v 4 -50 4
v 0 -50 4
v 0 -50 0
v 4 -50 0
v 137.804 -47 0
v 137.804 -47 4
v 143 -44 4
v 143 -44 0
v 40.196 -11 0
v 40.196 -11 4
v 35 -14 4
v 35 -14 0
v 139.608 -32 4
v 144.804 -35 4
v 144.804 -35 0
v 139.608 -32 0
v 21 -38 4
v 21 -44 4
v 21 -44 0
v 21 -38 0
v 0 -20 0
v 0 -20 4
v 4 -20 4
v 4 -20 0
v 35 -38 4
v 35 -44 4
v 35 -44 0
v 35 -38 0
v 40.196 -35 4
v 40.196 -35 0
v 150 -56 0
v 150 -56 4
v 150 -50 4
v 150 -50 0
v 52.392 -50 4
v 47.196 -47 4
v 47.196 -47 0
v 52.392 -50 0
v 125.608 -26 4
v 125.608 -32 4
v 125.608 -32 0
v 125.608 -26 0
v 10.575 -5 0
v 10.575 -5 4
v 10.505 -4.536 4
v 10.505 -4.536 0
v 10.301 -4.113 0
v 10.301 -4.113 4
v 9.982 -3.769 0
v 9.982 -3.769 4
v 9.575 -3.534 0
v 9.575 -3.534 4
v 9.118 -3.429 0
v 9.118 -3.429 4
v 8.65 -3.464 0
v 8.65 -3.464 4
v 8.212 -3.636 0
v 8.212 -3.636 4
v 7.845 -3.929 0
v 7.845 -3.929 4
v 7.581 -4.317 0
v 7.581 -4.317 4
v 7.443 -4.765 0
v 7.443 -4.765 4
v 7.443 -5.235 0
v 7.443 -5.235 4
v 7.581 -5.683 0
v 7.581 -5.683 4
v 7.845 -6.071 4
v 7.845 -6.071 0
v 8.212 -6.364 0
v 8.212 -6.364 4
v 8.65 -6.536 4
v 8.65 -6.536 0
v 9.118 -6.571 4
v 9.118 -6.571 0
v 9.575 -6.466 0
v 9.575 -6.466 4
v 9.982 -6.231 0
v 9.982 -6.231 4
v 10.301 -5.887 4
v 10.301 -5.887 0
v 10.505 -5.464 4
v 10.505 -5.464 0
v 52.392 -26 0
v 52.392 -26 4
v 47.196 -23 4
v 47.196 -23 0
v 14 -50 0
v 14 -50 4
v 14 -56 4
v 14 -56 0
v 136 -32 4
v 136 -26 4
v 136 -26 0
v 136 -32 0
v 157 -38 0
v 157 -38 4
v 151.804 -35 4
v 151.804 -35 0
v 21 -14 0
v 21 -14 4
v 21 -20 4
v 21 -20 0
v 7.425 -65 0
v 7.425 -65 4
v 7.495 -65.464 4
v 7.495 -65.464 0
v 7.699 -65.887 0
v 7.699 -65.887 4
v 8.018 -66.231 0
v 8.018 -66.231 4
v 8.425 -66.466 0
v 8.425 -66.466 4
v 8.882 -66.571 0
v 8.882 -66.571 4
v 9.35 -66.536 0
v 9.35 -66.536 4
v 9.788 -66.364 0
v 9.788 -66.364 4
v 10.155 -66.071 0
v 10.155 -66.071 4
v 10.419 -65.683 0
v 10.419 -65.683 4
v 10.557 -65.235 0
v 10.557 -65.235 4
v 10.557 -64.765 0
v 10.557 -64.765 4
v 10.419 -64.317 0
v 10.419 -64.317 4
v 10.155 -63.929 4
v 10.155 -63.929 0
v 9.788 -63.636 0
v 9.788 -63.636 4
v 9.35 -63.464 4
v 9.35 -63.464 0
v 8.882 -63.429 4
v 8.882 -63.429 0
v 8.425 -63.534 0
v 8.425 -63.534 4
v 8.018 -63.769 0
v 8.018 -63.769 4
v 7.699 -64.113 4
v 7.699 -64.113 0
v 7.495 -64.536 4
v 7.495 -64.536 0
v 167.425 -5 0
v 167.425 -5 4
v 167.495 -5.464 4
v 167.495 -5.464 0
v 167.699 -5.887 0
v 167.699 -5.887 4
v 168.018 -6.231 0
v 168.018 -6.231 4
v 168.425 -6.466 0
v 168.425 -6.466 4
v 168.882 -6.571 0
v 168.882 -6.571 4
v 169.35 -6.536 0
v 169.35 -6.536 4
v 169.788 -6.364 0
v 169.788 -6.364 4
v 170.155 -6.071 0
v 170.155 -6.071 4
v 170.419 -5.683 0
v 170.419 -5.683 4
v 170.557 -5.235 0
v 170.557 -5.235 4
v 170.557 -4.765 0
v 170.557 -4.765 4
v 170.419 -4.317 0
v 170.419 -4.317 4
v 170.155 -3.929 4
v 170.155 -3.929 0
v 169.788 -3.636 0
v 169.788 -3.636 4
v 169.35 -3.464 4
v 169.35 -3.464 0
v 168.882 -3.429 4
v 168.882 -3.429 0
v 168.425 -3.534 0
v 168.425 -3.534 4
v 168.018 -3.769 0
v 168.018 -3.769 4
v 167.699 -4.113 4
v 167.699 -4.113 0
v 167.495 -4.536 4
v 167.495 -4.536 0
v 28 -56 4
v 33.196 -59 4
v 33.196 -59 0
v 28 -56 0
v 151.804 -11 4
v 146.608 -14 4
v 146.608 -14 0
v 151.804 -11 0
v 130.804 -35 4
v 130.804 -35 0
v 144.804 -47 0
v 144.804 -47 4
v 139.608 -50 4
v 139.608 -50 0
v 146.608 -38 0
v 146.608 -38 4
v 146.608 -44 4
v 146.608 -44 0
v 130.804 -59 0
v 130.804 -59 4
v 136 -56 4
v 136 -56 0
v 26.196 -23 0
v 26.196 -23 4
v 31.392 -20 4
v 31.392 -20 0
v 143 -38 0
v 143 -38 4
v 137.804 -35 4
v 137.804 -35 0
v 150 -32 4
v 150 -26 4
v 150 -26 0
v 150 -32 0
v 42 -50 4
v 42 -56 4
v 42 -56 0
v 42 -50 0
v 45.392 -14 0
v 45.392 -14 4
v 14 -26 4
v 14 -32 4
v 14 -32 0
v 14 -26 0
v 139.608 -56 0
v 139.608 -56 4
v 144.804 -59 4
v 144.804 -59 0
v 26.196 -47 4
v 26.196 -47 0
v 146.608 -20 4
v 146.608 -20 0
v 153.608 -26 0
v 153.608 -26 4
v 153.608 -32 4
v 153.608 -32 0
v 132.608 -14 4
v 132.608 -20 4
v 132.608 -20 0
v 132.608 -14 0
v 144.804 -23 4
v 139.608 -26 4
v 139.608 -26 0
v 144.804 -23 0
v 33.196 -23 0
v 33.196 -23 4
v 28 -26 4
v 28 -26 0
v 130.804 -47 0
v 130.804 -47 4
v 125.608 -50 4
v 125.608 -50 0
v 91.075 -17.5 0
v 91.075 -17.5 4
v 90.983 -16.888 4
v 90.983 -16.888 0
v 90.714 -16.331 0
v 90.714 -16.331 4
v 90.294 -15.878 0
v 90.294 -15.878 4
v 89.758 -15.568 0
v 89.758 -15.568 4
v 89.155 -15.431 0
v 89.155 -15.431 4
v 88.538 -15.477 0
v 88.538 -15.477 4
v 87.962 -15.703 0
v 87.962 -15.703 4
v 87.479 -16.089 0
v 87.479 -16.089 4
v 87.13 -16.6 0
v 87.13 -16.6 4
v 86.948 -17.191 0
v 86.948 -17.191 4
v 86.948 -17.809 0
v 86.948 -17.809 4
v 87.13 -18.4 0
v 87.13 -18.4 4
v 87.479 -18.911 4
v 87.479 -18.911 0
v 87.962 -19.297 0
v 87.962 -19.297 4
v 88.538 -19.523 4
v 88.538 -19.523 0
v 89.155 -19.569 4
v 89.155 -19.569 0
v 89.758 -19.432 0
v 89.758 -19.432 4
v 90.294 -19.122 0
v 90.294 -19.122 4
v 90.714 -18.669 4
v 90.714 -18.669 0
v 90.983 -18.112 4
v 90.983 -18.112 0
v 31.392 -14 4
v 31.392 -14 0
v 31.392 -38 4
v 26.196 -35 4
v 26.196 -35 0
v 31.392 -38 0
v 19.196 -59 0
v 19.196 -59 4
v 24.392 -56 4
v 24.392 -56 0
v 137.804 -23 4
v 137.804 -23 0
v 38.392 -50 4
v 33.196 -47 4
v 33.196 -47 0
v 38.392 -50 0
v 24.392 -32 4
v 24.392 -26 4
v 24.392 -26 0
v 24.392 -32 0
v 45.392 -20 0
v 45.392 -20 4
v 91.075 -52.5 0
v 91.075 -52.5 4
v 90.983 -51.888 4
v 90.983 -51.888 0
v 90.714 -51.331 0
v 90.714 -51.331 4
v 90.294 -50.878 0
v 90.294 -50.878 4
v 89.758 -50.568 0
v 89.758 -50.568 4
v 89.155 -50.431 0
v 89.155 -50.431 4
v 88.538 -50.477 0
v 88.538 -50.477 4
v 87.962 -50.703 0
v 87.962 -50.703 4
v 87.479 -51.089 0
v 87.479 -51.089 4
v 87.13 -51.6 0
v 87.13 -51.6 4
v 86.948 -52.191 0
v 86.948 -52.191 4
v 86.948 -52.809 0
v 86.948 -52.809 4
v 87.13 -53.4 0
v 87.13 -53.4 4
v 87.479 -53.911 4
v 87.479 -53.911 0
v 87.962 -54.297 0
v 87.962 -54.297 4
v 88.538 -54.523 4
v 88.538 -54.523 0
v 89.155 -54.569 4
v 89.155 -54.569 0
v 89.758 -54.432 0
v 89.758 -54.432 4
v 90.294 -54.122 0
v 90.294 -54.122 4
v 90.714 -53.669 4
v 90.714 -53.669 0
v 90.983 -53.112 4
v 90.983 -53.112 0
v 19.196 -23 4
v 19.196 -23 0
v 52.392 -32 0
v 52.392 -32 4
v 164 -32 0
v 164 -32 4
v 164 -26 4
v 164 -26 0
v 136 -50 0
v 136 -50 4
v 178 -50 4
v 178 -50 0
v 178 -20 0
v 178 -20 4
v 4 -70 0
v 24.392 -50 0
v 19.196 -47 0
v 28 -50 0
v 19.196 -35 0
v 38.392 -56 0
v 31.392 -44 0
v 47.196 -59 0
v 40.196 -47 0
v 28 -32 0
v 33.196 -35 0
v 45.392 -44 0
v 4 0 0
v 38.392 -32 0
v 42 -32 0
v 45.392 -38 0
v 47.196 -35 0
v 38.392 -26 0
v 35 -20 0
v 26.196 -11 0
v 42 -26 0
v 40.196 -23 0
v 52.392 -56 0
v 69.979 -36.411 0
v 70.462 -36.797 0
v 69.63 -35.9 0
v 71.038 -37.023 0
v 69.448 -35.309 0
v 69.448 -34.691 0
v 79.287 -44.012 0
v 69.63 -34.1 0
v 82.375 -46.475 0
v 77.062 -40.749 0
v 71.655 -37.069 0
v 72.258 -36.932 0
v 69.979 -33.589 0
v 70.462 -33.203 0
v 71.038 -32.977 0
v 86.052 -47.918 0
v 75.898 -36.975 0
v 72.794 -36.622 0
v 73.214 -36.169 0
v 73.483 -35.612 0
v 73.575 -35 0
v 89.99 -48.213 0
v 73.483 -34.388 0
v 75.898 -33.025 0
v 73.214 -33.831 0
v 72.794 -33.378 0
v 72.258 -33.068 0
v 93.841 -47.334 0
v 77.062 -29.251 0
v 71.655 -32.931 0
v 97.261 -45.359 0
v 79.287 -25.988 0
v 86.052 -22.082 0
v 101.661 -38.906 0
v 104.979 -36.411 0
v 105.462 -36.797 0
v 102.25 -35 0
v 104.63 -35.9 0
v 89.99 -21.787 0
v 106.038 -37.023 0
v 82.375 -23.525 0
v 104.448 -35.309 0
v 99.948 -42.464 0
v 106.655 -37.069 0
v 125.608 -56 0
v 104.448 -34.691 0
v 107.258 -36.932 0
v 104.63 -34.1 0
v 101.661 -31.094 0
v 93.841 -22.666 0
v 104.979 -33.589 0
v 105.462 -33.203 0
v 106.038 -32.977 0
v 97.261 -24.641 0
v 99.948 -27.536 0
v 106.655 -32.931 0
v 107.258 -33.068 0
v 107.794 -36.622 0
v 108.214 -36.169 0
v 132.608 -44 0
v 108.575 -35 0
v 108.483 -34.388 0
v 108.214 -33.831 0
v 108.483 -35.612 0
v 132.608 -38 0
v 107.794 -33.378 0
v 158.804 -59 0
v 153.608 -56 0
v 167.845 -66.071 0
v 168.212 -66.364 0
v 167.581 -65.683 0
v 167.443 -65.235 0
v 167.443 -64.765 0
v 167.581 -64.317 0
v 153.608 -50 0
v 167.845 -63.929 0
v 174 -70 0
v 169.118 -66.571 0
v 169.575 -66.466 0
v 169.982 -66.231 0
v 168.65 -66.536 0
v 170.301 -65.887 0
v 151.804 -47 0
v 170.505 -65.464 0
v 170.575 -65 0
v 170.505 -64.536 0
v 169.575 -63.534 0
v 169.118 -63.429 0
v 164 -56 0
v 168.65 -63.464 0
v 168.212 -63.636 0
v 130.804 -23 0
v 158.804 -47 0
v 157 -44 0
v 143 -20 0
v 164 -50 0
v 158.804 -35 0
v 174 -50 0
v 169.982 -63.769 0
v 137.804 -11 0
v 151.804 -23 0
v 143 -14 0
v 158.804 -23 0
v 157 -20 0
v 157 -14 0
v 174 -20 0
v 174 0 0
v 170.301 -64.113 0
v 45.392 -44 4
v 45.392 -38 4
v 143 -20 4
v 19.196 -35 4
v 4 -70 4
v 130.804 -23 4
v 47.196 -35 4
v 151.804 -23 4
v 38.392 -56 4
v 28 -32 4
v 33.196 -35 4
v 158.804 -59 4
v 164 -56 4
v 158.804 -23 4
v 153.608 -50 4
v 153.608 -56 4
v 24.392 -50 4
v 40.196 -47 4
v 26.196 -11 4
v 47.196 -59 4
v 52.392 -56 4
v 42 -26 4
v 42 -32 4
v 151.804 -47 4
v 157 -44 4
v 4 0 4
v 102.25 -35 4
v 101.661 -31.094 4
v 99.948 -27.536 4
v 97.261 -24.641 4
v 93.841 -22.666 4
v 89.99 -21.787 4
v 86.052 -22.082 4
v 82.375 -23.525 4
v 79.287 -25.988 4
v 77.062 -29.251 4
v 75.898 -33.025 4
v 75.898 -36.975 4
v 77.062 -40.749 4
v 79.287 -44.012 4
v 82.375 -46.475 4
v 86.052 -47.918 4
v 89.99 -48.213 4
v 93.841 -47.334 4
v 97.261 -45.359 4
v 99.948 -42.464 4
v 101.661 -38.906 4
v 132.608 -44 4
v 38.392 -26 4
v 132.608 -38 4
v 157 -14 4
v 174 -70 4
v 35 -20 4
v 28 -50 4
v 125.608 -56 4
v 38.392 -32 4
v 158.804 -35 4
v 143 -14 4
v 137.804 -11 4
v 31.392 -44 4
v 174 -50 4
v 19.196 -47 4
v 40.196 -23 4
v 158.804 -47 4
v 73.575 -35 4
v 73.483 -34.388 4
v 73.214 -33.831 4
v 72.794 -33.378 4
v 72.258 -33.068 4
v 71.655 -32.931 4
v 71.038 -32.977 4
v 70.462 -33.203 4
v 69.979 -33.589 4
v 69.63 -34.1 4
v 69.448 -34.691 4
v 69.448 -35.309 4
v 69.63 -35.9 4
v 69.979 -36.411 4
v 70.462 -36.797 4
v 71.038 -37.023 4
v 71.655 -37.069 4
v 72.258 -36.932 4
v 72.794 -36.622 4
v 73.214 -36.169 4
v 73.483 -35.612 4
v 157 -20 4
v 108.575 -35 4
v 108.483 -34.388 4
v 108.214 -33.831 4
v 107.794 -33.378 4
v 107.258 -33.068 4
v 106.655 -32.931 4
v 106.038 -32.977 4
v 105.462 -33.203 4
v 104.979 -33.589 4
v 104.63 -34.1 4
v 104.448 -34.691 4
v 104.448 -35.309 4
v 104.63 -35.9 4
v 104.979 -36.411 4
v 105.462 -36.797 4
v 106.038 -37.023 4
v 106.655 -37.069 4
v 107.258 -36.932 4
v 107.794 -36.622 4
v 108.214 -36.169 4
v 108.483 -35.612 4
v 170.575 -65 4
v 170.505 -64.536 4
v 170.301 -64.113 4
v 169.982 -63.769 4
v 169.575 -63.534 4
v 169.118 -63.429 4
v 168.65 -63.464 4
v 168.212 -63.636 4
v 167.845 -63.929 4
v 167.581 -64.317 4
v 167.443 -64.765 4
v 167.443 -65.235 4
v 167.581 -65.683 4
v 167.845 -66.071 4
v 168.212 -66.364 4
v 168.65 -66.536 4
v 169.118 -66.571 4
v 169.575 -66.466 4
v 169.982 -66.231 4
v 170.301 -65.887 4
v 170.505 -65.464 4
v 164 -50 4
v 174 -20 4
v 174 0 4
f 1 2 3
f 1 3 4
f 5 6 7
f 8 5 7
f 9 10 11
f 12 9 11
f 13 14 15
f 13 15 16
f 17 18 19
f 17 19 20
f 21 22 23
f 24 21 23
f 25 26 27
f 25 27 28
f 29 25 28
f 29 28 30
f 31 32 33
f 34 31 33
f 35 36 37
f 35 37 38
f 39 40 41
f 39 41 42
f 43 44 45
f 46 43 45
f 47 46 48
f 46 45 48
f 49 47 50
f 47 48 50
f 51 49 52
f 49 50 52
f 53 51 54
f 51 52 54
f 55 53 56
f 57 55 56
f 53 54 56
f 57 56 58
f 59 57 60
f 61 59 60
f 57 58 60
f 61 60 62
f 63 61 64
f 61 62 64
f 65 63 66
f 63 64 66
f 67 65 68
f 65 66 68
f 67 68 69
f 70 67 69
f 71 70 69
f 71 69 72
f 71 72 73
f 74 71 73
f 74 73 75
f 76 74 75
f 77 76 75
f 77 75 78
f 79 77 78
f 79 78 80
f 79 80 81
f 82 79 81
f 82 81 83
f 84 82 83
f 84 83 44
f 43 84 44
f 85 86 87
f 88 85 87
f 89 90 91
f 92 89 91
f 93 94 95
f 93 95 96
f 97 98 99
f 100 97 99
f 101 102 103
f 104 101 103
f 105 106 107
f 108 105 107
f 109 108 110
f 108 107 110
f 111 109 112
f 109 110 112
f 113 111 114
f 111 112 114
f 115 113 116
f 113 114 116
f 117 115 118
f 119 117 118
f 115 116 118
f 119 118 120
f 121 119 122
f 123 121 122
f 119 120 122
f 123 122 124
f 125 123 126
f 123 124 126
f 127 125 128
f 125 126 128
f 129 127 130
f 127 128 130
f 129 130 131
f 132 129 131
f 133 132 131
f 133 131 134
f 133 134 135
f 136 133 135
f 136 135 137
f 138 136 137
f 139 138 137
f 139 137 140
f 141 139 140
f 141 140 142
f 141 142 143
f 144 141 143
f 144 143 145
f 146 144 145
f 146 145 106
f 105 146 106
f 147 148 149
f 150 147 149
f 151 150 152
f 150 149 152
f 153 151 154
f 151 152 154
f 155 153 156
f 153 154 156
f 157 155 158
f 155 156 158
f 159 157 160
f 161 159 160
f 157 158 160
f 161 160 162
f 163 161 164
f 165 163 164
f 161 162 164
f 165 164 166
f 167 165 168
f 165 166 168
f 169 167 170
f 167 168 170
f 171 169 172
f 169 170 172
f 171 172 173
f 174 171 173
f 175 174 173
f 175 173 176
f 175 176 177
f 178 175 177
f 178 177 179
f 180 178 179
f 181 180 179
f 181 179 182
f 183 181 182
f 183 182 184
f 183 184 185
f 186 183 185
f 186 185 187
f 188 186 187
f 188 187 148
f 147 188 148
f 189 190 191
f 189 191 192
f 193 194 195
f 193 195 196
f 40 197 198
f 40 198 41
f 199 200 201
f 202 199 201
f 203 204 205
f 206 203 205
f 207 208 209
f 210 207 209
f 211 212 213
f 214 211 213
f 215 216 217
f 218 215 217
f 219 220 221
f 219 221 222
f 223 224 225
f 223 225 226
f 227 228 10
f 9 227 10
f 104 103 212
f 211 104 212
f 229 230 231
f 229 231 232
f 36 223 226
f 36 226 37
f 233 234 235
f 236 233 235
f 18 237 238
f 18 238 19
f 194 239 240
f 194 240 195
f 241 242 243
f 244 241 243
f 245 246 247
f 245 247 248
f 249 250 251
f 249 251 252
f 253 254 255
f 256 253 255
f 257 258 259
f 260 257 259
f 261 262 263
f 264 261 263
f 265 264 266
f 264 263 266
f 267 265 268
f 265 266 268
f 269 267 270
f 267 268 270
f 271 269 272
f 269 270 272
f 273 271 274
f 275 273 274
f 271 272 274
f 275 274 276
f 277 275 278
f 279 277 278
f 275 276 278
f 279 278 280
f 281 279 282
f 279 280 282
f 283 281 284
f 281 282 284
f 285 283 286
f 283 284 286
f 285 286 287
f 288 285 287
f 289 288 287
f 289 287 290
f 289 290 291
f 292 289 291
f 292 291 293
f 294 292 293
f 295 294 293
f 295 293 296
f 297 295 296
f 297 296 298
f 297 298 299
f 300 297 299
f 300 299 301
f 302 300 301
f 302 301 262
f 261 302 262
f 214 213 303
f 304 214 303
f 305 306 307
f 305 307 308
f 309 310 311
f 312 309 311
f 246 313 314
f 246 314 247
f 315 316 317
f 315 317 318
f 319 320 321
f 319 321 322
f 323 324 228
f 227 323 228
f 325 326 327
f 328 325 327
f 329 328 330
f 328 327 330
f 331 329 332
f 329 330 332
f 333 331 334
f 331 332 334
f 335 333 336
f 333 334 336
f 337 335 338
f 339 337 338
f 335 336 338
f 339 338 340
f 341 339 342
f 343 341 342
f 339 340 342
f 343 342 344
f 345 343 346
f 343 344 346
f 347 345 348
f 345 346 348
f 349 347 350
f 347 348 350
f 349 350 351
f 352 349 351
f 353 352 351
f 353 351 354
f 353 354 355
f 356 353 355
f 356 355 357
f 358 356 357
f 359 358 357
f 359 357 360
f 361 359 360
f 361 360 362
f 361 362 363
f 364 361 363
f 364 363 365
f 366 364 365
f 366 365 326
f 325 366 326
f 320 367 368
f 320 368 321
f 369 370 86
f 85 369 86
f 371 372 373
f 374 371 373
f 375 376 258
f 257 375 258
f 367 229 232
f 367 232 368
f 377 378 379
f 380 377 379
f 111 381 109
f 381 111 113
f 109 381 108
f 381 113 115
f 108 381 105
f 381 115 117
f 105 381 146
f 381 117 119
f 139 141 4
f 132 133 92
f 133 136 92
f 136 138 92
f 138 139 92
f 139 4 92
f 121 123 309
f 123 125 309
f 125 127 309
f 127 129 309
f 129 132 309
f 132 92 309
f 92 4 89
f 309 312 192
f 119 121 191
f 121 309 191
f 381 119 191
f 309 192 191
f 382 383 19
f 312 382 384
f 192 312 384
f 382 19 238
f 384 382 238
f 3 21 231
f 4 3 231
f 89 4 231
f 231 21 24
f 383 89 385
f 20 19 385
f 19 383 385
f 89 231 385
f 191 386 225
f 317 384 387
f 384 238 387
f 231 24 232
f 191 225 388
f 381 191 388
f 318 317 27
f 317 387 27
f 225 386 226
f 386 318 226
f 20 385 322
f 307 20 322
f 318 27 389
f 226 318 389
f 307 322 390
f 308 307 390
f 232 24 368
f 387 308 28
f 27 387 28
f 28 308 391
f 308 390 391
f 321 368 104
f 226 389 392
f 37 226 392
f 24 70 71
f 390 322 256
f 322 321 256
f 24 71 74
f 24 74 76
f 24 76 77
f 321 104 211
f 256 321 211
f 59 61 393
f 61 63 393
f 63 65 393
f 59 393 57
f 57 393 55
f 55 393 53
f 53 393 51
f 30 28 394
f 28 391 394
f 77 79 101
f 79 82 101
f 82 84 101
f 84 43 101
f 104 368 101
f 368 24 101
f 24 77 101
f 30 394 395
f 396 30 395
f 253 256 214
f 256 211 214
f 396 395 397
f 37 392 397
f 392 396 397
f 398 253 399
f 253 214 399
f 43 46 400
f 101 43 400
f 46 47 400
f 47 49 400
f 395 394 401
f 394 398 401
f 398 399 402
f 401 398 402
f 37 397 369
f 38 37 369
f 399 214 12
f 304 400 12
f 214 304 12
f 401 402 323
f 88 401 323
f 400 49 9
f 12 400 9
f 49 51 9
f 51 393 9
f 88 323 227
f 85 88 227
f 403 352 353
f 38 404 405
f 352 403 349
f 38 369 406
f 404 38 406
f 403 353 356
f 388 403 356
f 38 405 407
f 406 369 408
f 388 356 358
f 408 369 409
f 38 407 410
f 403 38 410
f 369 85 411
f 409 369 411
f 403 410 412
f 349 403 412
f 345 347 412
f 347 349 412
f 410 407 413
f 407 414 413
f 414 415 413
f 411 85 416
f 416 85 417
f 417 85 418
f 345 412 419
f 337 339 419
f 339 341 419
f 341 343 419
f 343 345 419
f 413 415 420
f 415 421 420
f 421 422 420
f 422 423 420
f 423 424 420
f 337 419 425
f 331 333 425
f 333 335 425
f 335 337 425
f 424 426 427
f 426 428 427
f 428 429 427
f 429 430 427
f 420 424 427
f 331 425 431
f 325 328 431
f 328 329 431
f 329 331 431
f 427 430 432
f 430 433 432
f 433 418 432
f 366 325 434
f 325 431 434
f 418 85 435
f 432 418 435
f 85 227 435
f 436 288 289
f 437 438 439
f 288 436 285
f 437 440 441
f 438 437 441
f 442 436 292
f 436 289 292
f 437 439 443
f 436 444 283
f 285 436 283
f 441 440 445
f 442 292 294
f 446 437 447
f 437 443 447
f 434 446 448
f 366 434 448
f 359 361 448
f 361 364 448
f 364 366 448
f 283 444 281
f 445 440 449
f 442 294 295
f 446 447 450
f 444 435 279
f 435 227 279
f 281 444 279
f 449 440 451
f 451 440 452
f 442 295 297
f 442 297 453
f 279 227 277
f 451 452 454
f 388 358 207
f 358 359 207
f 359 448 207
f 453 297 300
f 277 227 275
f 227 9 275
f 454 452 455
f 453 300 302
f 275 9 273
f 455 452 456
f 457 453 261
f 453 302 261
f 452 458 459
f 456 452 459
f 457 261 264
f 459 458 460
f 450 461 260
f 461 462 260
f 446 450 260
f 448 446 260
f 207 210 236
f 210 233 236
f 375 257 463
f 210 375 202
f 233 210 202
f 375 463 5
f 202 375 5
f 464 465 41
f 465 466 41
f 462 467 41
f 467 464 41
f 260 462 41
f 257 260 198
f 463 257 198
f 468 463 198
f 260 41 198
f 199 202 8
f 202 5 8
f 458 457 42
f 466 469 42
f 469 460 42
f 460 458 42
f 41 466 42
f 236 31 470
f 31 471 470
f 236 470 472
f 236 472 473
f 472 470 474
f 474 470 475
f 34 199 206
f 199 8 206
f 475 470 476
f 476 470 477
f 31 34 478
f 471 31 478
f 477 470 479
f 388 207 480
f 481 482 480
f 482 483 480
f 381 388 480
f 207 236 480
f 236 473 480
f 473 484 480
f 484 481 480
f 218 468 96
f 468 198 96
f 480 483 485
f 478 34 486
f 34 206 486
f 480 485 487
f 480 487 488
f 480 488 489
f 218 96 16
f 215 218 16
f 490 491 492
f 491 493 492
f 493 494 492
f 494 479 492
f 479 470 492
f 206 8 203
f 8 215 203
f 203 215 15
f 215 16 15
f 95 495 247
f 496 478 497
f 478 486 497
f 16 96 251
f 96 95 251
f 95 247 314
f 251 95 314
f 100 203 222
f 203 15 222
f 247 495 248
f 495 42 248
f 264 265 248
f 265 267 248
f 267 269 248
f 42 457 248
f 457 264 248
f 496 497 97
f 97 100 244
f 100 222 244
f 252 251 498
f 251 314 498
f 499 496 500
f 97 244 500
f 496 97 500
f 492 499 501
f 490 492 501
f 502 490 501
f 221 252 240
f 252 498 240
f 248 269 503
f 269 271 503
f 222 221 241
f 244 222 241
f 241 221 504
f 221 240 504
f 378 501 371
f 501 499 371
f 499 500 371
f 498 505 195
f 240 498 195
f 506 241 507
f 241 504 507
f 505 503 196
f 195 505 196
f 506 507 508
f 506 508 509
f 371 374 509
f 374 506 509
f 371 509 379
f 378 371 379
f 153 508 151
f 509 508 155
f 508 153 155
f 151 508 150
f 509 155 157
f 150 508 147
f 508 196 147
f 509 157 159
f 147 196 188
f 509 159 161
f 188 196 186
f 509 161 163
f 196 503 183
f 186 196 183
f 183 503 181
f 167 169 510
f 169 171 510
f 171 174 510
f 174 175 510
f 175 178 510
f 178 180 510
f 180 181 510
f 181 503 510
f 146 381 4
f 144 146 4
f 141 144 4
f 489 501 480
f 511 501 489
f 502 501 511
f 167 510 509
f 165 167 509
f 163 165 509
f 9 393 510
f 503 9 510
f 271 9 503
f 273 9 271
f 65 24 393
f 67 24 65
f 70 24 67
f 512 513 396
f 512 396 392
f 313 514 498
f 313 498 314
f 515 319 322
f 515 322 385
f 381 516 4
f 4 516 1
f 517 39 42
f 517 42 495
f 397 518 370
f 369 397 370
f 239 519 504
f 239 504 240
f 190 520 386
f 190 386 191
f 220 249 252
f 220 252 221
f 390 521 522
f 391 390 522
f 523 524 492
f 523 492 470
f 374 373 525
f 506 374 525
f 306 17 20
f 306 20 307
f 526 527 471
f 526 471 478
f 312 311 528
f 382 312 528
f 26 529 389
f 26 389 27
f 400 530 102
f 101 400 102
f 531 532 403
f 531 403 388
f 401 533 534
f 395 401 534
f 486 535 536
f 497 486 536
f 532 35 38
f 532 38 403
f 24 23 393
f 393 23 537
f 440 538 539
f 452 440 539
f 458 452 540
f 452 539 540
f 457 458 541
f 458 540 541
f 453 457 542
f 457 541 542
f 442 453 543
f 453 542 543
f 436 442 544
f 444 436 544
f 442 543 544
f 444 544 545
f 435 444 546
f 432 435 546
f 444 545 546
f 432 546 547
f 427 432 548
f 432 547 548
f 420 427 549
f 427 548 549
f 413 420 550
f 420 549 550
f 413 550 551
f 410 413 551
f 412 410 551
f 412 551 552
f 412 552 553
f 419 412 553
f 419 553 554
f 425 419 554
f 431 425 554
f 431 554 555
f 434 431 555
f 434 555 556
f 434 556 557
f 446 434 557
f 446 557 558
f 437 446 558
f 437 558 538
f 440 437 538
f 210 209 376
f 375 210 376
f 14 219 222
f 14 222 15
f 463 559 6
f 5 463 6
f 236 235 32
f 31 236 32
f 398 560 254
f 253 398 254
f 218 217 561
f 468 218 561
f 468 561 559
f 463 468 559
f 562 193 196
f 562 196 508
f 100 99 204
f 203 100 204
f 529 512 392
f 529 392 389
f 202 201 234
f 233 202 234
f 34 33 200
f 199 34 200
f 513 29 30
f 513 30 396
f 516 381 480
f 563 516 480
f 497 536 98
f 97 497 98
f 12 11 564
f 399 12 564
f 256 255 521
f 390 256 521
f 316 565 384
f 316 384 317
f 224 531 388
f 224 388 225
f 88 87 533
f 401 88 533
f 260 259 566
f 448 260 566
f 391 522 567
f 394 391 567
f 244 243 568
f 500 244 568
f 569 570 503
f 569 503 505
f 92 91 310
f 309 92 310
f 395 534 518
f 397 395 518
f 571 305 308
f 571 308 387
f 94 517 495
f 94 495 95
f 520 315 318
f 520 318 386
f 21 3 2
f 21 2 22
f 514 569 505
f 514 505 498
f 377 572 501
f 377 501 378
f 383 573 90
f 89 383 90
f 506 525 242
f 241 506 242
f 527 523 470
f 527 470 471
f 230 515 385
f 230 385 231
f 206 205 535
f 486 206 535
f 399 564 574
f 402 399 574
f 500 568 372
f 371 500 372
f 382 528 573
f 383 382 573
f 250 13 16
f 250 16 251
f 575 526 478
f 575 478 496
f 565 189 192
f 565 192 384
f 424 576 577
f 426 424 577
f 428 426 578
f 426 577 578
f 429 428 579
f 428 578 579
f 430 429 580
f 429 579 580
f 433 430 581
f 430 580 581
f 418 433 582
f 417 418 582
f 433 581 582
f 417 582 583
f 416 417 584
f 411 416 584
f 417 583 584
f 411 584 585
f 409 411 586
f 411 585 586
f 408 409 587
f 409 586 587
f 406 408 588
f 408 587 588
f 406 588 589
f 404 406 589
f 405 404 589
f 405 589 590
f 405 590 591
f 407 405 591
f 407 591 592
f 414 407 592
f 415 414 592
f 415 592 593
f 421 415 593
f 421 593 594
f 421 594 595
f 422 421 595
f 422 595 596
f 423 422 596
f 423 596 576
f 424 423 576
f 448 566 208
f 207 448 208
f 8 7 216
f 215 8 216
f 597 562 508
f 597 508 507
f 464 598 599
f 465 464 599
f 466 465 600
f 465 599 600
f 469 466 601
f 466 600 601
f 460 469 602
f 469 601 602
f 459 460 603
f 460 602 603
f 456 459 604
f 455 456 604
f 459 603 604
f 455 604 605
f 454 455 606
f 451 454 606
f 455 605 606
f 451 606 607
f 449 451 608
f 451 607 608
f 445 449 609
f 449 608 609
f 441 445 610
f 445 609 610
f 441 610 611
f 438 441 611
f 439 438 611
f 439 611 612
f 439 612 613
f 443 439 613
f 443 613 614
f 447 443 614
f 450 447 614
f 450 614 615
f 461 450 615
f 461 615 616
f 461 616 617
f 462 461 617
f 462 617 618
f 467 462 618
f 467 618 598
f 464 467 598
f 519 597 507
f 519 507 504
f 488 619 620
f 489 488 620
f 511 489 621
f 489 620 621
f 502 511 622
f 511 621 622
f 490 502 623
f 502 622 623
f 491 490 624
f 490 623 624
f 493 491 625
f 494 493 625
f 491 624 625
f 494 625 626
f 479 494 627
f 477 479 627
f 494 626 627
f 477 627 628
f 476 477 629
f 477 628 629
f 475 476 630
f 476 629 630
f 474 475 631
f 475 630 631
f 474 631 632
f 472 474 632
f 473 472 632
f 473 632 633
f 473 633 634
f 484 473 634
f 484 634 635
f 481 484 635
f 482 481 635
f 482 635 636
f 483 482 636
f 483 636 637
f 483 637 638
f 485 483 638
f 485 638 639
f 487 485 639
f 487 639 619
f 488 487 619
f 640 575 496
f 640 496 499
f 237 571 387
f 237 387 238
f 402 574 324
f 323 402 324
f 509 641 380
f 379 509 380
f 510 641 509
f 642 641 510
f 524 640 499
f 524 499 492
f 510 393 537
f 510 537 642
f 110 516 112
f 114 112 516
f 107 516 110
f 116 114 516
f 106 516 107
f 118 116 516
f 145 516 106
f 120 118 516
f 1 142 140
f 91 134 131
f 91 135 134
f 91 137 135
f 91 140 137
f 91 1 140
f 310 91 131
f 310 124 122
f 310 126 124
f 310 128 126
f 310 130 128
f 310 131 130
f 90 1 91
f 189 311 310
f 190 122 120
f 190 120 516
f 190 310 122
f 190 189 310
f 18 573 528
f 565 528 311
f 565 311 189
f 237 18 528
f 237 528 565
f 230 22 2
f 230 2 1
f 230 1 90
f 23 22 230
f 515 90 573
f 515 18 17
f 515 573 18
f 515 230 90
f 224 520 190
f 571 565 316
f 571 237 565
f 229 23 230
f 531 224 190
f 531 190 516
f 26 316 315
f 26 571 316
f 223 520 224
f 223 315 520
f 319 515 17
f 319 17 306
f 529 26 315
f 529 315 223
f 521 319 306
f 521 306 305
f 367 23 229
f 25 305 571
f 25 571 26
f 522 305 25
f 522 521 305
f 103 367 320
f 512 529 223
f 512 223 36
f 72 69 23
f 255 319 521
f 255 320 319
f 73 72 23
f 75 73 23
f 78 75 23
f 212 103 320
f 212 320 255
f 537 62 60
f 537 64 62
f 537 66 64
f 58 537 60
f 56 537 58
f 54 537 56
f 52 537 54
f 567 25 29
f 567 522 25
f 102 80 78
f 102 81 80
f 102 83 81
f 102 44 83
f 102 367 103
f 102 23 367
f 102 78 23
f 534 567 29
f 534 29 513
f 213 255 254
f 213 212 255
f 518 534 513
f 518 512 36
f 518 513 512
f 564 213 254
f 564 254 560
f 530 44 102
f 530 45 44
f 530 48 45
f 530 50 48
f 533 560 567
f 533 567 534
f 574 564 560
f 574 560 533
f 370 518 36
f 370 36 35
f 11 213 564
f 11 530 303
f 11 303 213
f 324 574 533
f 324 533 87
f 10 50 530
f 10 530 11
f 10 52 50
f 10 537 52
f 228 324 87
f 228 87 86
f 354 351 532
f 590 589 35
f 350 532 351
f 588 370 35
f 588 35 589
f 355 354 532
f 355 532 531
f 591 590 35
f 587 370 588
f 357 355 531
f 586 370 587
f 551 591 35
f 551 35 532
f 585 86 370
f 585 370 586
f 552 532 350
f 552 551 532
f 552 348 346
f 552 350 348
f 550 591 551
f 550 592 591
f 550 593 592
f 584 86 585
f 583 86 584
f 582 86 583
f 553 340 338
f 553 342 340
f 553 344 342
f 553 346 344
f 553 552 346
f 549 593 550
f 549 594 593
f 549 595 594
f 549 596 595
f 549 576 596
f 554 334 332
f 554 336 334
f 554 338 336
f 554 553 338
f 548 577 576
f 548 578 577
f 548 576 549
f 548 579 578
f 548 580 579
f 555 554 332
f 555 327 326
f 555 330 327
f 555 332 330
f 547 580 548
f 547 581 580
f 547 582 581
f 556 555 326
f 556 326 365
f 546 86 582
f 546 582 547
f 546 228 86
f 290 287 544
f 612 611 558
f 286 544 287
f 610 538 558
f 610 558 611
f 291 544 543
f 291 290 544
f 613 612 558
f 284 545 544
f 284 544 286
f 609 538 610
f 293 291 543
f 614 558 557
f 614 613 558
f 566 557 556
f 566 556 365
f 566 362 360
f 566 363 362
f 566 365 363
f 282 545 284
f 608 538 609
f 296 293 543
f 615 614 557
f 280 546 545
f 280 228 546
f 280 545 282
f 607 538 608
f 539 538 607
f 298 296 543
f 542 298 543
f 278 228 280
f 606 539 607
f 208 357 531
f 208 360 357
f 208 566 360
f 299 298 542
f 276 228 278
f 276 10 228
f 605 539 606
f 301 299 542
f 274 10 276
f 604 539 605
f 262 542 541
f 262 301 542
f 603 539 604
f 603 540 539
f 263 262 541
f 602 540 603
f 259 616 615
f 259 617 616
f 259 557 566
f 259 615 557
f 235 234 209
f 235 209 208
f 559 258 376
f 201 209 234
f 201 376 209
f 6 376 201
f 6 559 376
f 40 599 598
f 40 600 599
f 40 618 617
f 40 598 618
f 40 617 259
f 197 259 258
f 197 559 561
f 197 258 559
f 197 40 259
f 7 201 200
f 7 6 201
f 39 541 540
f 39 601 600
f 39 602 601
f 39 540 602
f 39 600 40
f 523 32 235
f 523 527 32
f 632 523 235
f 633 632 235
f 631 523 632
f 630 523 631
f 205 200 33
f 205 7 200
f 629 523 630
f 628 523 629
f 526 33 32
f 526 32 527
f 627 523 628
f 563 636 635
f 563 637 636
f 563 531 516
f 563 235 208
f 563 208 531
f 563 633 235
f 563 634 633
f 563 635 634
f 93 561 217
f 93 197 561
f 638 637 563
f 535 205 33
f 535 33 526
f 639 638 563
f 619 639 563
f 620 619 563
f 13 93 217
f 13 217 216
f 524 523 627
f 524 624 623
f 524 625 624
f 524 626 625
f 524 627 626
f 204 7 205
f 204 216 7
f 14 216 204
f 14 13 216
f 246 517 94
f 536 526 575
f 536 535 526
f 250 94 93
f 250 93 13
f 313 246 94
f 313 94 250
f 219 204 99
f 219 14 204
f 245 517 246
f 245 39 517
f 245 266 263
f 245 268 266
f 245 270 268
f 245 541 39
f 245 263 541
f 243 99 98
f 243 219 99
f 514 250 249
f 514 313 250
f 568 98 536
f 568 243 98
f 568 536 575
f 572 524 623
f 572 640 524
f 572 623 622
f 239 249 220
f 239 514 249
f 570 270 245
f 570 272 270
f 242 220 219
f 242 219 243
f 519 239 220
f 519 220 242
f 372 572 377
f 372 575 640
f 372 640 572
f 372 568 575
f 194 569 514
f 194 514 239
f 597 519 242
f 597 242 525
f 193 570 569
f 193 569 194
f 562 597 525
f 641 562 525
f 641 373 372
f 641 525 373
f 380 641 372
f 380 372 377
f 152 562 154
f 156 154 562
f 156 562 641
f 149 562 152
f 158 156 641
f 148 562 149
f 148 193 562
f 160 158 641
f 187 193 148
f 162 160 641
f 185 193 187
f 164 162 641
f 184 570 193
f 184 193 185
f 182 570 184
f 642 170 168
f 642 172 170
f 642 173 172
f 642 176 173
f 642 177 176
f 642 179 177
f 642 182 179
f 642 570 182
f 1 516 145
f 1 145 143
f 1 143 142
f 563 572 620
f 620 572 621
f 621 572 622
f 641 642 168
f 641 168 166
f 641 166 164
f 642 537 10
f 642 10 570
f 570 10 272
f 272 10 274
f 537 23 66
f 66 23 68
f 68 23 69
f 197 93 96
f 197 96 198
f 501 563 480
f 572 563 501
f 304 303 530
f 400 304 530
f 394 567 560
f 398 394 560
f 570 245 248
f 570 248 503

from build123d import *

# Parameters (mm, degrees)
SKETCH_1_W          = 178
SKETCH_1_H          = 70
EXTRUDE_1_DEPTH     = 4
SKETCH_2_R          = 13.25
SKETCH_2_R_2        = 2.075
SKETCH_2_R_3        = 1.575
SKETCH_2_W          = 4
SKETCH_2_H          = 20
CUT_EXTRUDE_1_DEPTH = 192.311264697


with BuildPart() as part:
    # 草图1 → 凸台-拉伸1 (new body)
    with BuildSketch(Plane.XY):
        with Locations((89, -35)):
            Rectangle(SKETCH_1_W, SKETCH_1_H)
    extrude(amount=EXTRUDE_1_DEPTH)

    # 草图2 → 切除-拉伸1 (cut, through all)
    with BuildSketch(Plane.XY.offset(4)):
        with Locations((89, -35)):
            Circle(SKETCH_2_R)
        with Locations((89, -17.5)):
            Circle(SKETCH_2_R_2)
        with Locations((106.5, -35)):
            Circle(SKETCH_2_R_2)
        with Locations((89, -52.5)):
            Circle(SKETCH_2_R_2)
        with Locations((71.5, -35)):
            Circle(SKETCH_2_R_2)
        with Locations((9, -5)):
            Circle(SKETCH_2_R_3)
        with Locations(Location((9, -65, 0), (0, 0, 180))):
            Circle(SKETCH_2_R_3)
        with Locations((169, -65)):
            Circle(SKETCH_2_R_3)
        with Locations(Location((169, -5, 0), (0, 0, 180))):
            Circle(SKETCH_2_R_3)
        Polygon((40.196152423, -11), (35, -14), (35, -20), (40.196152423, -23), (45.392304845, -20), (45.392304845, -14), align=None)
        with Locations((2, -10)):
            Rectangle(SKETCH_2_W, SKETCH_2_H)
        with Locations((176, -10)):
            Rectangle(SKETCH_2_W, SKETCH_2_H)
        with Locations((176, -60)):
            Rectangle(SKETCH_2_W, SKETCH_2_H)
        with Locations((2, -60)):
            Rectangle(SKETCH_2_W, SKETCH_2_H)
        Polygon((26.196152423, -23), (31.392304845, -20), (31.392304845, -14), (26.196152423, -11), (21, -14), (21, -20), align=None)
        Polygon((33.196152423, -35), (38.392304845, -32), (38.392304845, -26), (33.196152423, -23), (28, -26), (28, -32), align=None)
        Polygon((47.196152423, -23), (42, -26), (42, -32), (47.196152423, -35), (52.392304845, -32), (52.392304845, -26), align=None)
        Polygon((14, -26), (19.196152423, -23), (24.392304845, -26), (24.392304845, -32), (19.196152423, -35), (14, -32), align=None)
        Polygon((35, -44), (35, -38), (40.196152423, -35), (45.392304845, -38), (45.392304845, -44), (40.196152423, -47), align=None)
        Polygon((21, -38), (26.196152423, -35), (31.392304845, -38), (31.392304845, -44), (26.196152423, -47), (21, -44), align=None)
        Polygon((14, -50), (14, -56), (19.196152423, -59), (24.392304845, -56), (24.392304845, -50), (19.196152423, -47), align=None)
        Polygon((42, -56), (42, -50), (47.196152423, -47), (52.392304845, -50), (52.392304845, -56), (47.196152423, -59), align=None)
        Polygon((28, -50), (33.196152423, -47), (38.392304845, -50), (38.392304845, -56), (33.196152423, -59), (28, -56), align=None)
        Polygon((144.803847577, -47), (139.607695155, -50), (139.607695155, -56), (144.803847577, -59), (150, -56), (150, -50), align=None)
        Polygon((130.803847577, -59), (136, -56), (136, -50), (130.803847577, -47), (125.607695155, -50), (125.607695155, -56), align=None)
        Polygon((164, -56), (158.803847577, -59), (153.607695155, -56), (153.607695155, -50), (158.803847577, -47), (164, -50), align=None)
        Polygon((137.803847577, -47), (143, -44), (143, -38), (137.803847577, -35), (132.607695155, -38), (132.607695155, -44), align=None)
        Polygon((151.803847577, -35), (146.607695155, -38), (146.607695155, -44), (151.803847577, -47), (157, -44), (157, -38), align=None)
        Polygon((164, -32), (164, -26), (158.803847577, -23), (153.607695155, -26), (153.607695155, -32), (158.803847577, -35), align=None)
        Polygon((136, -26), (136, -32), (130.803847577, -35), (125.607695155, -32), (125.607695155, -26), (130.803847577, -23), align=None)
        Polygon((150, -32), (144.803847577, -35), (139.607695155, -32), (139.607695155, -26), (144.803847577, -23), (150, -26), align=None)
        Polygon((143, -14), (143, -20), (137.803847577, -23), (132.607695155, -20), (132.607695155, -14), (137.803847577, -11), align=None)
        Polygon((157, -20), (151.803847577, -23), (146.607695155, -20), (146.607695155, -14), (151.803847577, -11), (157, -14), align=None)
    extrude(amount=-CUT_EXTRUDE_1_DEPTH, mode=Mode.SUBTRACT)


solid = part.part
